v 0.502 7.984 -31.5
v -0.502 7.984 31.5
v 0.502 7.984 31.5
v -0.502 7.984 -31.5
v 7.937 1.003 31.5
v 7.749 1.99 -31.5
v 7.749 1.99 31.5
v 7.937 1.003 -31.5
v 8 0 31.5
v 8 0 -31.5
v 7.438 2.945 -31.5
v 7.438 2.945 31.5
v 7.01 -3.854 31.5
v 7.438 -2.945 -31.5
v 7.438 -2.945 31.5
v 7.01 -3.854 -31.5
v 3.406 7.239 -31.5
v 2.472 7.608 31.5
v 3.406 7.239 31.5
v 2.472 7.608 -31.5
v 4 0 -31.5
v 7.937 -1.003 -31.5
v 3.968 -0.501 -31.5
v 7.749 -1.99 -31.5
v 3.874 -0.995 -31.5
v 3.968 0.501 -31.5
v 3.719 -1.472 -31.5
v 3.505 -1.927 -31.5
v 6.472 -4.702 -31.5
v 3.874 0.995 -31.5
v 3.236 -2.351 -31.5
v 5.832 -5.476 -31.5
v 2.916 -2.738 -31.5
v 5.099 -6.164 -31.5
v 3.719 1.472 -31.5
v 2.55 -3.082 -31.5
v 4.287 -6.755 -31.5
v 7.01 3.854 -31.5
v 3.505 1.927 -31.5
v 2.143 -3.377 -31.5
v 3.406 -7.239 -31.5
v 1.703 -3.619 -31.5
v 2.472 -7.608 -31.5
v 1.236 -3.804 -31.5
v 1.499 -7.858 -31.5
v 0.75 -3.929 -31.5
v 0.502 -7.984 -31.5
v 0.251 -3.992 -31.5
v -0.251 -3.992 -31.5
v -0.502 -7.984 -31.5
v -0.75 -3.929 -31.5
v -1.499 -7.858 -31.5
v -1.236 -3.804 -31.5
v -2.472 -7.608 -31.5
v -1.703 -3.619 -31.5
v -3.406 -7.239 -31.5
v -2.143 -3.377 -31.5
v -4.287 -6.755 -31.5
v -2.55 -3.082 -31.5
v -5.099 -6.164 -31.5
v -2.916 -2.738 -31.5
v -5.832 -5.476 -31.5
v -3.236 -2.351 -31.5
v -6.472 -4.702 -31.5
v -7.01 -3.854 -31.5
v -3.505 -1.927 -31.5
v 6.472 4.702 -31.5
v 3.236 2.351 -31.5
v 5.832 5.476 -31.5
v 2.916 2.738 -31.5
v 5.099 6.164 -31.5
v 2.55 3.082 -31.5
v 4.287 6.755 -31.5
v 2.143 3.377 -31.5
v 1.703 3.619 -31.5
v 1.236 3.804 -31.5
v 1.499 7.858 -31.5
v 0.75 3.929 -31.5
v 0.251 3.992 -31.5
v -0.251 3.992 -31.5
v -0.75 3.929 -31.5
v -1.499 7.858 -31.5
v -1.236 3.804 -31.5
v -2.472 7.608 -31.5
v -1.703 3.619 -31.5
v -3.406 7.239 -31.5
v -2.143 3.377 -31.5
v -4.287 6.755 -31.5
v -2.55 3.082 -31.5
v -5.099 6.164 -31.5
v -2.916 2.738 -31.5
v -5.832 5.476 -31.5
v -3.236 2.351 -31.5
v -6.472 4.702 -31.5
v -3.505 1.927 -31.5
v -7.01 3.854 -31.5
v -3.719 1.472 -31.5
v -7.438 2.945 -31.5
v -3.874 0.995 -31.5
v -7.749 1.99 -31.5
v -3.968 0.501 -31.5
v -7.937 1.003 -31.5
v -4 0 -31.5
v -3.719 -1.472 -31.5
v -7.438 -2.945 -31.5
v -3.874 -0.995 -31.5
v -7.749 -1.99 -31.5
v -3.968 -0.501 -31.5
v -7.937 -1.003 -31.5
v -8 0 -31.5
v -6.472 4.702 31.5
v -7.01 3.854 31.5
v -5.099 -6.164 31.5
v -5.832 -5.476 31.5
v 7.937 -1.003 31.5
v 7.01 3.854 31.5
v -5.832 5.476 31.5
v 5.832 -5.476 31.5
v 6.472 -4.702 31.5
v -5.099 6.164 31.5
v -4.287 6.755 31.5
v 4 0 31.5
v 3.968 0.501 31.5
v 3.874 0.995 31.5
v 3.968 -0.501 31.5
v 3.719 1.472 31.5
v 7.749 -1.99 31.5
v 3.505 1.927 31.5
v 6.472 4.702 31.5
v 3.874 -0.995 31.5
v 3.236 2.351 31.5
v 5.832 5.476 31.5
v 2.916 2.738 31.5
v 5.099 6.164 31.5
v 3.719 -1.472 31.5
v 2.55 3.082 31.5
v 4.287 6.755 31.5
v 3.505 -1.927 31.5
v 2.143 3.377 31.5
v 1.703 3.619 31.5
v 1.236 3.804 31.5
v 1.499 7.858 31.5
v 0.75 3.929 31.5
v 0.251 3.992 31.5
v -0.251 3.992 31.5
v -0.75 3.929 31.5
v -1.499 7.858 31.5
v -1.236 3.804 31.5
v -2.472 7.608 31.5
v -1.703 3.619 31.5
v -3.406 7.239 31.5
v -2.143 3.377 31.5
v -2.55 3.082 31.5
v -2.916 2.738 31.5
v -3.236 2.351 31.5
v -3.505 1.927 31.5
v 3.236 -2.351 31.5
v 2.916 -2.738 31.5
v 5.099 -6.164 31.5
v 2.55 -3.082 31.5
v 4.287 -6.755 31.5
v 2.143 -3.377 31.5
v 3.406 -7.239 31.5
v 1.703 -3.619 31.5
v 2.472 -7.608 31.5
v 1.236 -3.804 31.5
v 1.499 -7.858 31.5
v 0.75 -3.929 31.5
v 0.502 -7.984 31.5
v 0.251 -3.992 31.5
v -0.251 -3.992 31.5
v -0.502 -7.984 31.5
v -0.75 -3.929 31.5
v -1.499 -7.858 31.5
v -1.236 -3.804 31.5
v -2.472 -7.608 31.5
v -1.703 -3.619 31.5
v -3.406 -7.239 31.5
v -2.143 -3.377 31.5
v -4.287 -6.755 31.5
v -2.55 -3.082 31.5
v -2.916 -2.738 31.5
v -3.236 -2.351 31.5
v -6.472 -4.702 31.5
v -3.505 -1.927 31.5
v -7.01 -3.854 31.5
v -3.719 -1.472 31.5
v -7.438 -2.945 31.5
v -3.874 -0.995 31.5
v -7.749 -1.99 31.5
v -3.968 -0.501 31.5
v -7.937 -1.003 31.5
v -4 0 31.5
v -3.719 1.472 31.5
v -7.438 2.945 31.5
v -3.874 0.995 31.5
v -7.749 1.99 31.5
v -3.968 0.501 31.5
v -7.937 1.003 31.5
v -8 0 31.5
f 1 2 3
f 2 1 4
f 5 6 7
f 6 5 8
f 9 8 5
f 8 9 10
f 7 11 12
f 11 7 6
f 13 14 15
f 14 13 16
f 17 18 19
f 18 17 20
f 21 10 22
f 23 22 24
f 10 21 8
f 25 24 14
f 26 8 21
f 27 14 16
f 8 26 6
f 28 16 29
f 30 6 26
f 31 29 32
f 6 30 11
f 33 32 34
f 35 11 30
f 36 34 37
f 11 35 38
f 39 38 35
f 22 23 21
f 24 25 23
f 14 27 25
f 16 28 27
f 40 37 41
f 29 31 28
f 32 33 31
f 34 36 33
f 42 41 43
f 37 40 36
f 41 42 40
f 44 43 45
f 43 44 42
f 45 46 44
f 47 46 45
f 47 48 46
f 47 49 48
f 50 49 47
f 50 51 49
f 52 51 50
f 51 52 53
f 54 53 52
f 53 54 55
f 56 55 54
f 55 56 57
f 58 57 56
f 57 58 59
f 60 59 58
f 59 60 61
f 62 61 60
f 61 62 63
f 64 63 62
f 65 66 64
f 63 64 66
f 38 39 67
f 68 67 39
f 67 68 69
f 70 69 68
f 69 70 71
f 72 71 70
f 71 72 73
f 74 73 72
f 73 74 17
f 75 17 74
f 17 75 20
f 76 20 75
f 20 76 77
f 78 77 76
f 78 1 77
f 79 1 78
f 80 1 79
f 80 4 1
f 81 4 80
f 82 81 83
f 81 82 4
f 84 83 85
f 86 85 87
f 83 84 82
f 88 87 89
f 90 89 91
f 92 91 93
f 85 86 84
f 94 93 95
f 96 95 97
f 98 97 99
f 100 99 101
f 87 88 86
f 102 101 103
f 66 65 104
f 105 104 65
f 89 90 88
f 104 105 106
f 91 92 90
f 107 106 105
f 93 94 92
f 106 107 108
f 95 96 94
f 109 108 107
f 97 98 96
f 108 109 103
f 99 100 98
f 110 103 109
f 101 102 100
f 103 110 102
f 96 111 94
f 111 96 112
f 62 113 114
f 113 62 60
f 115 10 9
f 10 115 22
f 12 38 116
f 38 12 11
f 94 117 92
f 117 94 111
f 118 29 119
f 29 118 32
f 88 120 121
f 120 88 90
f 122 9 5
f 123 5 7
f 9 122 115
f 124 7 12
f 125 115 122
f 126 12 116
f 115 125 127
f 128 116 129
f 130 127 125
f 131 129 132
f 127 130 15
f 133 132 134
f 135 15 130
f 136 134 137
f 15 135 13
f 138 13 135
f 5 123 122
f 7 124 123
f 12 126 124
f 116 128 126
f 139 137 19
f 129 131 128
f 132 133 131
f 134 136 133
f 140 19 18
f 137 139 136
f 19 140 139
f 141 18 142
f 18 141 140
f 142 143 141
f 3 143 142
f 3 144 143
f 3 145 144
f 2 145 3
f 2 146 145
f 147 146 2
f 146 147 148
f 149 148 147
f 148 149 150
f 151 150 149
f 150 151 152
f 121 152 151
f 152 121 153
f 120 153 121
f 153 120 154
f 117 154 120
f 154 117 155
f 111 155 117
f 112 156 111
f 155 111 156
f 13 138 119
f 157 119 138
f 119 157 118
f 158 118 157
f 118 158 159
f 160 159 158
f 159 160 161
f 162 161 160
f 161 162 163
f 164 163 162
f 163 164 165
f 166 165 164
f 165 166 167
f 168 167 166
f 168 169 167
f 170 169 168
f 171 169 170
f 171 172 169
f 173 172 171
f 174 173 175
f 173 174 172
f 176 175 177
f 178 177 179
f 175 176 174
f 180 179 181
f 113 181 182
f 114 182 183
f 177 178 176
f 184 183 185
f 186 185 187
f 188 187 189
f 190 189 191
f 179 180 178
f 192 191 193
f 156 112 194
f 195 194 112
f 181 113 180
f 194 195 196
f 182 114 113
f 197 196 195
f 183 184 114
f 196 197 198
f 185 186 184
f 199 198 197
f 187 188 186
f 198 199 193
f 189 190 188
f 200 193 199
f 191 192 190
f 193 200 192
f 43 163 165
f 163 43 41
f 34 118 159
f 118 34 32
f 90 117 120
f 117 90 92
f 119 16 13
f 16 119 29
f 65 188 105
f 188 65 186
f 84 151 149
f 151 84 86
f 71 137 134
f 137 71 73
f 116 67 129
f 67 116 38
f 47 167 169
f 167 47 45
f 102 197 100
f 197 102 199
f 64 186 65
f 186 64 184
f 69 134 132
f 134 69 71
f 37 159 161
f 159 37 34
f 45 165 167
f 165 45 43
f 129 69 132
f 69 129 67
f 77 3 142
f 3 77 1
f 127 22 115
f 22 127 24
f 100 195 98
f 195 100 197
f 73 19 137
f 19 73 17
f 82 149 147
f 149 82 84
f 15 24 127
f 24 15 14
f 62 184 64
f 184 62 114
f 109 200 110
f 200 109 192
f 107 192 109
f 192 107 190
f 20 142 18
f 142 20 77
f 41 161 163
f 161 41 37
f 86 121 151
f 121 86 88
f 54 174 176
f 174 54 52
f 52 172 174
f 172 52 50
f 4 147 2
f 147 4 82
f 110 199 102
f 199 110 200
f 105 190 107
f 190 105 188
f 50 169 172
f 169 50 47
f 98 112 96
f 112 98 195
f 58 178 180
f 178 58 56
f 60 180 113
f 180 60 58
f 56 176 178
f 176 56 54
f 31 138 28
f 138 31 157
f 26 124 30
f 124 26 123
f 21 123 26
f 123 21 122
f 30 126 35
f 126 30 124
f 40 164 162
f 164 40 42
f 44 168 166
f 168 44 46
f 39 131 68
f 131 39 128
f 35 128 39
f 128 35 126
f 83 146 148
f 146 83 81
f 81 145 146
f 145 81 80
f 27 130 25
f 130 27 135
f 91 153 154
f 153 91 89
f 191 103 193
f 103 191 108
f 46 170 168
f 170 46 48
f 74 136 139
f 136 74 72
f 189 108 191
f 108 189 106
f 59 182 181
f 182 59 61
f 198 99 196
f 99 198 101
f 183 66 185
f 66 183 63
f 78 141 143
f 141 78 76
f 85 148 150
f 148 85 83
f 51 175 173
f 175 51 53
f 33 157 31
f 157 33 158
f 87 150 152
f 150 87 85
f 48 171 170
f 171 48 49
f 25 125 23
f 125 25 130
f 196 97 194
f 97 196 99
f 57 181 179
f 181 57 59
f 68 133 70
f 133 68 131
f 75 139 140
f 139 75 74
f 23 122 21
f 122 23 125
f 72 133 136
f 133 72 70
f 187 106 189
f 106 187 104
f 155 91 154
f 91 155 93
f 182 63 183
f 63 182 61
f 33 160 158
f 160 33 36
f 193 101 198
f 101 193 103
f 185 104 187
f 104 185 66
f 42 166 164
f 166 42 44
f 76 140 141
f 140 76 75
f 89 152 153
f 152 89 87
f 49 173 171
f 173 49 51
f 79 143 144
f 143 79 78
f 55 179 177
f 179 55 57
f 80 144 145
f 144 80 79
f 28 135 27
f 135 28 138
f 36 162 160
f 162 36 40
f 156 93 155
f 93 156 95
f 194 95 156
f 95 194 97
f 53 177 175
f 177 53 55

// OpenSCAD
$fn = 50;


difference() {
	union() {
		translate(v = [0, 0, -31.5000000000]) {
			cylinder(h = 63, r = 8.0000000000);
		}
	}
	union() {
		translate(v = [0, 0, -100.0000000000]) {
			cylinder(h = 200, r = 4.0000000000);
		}
	}
}
